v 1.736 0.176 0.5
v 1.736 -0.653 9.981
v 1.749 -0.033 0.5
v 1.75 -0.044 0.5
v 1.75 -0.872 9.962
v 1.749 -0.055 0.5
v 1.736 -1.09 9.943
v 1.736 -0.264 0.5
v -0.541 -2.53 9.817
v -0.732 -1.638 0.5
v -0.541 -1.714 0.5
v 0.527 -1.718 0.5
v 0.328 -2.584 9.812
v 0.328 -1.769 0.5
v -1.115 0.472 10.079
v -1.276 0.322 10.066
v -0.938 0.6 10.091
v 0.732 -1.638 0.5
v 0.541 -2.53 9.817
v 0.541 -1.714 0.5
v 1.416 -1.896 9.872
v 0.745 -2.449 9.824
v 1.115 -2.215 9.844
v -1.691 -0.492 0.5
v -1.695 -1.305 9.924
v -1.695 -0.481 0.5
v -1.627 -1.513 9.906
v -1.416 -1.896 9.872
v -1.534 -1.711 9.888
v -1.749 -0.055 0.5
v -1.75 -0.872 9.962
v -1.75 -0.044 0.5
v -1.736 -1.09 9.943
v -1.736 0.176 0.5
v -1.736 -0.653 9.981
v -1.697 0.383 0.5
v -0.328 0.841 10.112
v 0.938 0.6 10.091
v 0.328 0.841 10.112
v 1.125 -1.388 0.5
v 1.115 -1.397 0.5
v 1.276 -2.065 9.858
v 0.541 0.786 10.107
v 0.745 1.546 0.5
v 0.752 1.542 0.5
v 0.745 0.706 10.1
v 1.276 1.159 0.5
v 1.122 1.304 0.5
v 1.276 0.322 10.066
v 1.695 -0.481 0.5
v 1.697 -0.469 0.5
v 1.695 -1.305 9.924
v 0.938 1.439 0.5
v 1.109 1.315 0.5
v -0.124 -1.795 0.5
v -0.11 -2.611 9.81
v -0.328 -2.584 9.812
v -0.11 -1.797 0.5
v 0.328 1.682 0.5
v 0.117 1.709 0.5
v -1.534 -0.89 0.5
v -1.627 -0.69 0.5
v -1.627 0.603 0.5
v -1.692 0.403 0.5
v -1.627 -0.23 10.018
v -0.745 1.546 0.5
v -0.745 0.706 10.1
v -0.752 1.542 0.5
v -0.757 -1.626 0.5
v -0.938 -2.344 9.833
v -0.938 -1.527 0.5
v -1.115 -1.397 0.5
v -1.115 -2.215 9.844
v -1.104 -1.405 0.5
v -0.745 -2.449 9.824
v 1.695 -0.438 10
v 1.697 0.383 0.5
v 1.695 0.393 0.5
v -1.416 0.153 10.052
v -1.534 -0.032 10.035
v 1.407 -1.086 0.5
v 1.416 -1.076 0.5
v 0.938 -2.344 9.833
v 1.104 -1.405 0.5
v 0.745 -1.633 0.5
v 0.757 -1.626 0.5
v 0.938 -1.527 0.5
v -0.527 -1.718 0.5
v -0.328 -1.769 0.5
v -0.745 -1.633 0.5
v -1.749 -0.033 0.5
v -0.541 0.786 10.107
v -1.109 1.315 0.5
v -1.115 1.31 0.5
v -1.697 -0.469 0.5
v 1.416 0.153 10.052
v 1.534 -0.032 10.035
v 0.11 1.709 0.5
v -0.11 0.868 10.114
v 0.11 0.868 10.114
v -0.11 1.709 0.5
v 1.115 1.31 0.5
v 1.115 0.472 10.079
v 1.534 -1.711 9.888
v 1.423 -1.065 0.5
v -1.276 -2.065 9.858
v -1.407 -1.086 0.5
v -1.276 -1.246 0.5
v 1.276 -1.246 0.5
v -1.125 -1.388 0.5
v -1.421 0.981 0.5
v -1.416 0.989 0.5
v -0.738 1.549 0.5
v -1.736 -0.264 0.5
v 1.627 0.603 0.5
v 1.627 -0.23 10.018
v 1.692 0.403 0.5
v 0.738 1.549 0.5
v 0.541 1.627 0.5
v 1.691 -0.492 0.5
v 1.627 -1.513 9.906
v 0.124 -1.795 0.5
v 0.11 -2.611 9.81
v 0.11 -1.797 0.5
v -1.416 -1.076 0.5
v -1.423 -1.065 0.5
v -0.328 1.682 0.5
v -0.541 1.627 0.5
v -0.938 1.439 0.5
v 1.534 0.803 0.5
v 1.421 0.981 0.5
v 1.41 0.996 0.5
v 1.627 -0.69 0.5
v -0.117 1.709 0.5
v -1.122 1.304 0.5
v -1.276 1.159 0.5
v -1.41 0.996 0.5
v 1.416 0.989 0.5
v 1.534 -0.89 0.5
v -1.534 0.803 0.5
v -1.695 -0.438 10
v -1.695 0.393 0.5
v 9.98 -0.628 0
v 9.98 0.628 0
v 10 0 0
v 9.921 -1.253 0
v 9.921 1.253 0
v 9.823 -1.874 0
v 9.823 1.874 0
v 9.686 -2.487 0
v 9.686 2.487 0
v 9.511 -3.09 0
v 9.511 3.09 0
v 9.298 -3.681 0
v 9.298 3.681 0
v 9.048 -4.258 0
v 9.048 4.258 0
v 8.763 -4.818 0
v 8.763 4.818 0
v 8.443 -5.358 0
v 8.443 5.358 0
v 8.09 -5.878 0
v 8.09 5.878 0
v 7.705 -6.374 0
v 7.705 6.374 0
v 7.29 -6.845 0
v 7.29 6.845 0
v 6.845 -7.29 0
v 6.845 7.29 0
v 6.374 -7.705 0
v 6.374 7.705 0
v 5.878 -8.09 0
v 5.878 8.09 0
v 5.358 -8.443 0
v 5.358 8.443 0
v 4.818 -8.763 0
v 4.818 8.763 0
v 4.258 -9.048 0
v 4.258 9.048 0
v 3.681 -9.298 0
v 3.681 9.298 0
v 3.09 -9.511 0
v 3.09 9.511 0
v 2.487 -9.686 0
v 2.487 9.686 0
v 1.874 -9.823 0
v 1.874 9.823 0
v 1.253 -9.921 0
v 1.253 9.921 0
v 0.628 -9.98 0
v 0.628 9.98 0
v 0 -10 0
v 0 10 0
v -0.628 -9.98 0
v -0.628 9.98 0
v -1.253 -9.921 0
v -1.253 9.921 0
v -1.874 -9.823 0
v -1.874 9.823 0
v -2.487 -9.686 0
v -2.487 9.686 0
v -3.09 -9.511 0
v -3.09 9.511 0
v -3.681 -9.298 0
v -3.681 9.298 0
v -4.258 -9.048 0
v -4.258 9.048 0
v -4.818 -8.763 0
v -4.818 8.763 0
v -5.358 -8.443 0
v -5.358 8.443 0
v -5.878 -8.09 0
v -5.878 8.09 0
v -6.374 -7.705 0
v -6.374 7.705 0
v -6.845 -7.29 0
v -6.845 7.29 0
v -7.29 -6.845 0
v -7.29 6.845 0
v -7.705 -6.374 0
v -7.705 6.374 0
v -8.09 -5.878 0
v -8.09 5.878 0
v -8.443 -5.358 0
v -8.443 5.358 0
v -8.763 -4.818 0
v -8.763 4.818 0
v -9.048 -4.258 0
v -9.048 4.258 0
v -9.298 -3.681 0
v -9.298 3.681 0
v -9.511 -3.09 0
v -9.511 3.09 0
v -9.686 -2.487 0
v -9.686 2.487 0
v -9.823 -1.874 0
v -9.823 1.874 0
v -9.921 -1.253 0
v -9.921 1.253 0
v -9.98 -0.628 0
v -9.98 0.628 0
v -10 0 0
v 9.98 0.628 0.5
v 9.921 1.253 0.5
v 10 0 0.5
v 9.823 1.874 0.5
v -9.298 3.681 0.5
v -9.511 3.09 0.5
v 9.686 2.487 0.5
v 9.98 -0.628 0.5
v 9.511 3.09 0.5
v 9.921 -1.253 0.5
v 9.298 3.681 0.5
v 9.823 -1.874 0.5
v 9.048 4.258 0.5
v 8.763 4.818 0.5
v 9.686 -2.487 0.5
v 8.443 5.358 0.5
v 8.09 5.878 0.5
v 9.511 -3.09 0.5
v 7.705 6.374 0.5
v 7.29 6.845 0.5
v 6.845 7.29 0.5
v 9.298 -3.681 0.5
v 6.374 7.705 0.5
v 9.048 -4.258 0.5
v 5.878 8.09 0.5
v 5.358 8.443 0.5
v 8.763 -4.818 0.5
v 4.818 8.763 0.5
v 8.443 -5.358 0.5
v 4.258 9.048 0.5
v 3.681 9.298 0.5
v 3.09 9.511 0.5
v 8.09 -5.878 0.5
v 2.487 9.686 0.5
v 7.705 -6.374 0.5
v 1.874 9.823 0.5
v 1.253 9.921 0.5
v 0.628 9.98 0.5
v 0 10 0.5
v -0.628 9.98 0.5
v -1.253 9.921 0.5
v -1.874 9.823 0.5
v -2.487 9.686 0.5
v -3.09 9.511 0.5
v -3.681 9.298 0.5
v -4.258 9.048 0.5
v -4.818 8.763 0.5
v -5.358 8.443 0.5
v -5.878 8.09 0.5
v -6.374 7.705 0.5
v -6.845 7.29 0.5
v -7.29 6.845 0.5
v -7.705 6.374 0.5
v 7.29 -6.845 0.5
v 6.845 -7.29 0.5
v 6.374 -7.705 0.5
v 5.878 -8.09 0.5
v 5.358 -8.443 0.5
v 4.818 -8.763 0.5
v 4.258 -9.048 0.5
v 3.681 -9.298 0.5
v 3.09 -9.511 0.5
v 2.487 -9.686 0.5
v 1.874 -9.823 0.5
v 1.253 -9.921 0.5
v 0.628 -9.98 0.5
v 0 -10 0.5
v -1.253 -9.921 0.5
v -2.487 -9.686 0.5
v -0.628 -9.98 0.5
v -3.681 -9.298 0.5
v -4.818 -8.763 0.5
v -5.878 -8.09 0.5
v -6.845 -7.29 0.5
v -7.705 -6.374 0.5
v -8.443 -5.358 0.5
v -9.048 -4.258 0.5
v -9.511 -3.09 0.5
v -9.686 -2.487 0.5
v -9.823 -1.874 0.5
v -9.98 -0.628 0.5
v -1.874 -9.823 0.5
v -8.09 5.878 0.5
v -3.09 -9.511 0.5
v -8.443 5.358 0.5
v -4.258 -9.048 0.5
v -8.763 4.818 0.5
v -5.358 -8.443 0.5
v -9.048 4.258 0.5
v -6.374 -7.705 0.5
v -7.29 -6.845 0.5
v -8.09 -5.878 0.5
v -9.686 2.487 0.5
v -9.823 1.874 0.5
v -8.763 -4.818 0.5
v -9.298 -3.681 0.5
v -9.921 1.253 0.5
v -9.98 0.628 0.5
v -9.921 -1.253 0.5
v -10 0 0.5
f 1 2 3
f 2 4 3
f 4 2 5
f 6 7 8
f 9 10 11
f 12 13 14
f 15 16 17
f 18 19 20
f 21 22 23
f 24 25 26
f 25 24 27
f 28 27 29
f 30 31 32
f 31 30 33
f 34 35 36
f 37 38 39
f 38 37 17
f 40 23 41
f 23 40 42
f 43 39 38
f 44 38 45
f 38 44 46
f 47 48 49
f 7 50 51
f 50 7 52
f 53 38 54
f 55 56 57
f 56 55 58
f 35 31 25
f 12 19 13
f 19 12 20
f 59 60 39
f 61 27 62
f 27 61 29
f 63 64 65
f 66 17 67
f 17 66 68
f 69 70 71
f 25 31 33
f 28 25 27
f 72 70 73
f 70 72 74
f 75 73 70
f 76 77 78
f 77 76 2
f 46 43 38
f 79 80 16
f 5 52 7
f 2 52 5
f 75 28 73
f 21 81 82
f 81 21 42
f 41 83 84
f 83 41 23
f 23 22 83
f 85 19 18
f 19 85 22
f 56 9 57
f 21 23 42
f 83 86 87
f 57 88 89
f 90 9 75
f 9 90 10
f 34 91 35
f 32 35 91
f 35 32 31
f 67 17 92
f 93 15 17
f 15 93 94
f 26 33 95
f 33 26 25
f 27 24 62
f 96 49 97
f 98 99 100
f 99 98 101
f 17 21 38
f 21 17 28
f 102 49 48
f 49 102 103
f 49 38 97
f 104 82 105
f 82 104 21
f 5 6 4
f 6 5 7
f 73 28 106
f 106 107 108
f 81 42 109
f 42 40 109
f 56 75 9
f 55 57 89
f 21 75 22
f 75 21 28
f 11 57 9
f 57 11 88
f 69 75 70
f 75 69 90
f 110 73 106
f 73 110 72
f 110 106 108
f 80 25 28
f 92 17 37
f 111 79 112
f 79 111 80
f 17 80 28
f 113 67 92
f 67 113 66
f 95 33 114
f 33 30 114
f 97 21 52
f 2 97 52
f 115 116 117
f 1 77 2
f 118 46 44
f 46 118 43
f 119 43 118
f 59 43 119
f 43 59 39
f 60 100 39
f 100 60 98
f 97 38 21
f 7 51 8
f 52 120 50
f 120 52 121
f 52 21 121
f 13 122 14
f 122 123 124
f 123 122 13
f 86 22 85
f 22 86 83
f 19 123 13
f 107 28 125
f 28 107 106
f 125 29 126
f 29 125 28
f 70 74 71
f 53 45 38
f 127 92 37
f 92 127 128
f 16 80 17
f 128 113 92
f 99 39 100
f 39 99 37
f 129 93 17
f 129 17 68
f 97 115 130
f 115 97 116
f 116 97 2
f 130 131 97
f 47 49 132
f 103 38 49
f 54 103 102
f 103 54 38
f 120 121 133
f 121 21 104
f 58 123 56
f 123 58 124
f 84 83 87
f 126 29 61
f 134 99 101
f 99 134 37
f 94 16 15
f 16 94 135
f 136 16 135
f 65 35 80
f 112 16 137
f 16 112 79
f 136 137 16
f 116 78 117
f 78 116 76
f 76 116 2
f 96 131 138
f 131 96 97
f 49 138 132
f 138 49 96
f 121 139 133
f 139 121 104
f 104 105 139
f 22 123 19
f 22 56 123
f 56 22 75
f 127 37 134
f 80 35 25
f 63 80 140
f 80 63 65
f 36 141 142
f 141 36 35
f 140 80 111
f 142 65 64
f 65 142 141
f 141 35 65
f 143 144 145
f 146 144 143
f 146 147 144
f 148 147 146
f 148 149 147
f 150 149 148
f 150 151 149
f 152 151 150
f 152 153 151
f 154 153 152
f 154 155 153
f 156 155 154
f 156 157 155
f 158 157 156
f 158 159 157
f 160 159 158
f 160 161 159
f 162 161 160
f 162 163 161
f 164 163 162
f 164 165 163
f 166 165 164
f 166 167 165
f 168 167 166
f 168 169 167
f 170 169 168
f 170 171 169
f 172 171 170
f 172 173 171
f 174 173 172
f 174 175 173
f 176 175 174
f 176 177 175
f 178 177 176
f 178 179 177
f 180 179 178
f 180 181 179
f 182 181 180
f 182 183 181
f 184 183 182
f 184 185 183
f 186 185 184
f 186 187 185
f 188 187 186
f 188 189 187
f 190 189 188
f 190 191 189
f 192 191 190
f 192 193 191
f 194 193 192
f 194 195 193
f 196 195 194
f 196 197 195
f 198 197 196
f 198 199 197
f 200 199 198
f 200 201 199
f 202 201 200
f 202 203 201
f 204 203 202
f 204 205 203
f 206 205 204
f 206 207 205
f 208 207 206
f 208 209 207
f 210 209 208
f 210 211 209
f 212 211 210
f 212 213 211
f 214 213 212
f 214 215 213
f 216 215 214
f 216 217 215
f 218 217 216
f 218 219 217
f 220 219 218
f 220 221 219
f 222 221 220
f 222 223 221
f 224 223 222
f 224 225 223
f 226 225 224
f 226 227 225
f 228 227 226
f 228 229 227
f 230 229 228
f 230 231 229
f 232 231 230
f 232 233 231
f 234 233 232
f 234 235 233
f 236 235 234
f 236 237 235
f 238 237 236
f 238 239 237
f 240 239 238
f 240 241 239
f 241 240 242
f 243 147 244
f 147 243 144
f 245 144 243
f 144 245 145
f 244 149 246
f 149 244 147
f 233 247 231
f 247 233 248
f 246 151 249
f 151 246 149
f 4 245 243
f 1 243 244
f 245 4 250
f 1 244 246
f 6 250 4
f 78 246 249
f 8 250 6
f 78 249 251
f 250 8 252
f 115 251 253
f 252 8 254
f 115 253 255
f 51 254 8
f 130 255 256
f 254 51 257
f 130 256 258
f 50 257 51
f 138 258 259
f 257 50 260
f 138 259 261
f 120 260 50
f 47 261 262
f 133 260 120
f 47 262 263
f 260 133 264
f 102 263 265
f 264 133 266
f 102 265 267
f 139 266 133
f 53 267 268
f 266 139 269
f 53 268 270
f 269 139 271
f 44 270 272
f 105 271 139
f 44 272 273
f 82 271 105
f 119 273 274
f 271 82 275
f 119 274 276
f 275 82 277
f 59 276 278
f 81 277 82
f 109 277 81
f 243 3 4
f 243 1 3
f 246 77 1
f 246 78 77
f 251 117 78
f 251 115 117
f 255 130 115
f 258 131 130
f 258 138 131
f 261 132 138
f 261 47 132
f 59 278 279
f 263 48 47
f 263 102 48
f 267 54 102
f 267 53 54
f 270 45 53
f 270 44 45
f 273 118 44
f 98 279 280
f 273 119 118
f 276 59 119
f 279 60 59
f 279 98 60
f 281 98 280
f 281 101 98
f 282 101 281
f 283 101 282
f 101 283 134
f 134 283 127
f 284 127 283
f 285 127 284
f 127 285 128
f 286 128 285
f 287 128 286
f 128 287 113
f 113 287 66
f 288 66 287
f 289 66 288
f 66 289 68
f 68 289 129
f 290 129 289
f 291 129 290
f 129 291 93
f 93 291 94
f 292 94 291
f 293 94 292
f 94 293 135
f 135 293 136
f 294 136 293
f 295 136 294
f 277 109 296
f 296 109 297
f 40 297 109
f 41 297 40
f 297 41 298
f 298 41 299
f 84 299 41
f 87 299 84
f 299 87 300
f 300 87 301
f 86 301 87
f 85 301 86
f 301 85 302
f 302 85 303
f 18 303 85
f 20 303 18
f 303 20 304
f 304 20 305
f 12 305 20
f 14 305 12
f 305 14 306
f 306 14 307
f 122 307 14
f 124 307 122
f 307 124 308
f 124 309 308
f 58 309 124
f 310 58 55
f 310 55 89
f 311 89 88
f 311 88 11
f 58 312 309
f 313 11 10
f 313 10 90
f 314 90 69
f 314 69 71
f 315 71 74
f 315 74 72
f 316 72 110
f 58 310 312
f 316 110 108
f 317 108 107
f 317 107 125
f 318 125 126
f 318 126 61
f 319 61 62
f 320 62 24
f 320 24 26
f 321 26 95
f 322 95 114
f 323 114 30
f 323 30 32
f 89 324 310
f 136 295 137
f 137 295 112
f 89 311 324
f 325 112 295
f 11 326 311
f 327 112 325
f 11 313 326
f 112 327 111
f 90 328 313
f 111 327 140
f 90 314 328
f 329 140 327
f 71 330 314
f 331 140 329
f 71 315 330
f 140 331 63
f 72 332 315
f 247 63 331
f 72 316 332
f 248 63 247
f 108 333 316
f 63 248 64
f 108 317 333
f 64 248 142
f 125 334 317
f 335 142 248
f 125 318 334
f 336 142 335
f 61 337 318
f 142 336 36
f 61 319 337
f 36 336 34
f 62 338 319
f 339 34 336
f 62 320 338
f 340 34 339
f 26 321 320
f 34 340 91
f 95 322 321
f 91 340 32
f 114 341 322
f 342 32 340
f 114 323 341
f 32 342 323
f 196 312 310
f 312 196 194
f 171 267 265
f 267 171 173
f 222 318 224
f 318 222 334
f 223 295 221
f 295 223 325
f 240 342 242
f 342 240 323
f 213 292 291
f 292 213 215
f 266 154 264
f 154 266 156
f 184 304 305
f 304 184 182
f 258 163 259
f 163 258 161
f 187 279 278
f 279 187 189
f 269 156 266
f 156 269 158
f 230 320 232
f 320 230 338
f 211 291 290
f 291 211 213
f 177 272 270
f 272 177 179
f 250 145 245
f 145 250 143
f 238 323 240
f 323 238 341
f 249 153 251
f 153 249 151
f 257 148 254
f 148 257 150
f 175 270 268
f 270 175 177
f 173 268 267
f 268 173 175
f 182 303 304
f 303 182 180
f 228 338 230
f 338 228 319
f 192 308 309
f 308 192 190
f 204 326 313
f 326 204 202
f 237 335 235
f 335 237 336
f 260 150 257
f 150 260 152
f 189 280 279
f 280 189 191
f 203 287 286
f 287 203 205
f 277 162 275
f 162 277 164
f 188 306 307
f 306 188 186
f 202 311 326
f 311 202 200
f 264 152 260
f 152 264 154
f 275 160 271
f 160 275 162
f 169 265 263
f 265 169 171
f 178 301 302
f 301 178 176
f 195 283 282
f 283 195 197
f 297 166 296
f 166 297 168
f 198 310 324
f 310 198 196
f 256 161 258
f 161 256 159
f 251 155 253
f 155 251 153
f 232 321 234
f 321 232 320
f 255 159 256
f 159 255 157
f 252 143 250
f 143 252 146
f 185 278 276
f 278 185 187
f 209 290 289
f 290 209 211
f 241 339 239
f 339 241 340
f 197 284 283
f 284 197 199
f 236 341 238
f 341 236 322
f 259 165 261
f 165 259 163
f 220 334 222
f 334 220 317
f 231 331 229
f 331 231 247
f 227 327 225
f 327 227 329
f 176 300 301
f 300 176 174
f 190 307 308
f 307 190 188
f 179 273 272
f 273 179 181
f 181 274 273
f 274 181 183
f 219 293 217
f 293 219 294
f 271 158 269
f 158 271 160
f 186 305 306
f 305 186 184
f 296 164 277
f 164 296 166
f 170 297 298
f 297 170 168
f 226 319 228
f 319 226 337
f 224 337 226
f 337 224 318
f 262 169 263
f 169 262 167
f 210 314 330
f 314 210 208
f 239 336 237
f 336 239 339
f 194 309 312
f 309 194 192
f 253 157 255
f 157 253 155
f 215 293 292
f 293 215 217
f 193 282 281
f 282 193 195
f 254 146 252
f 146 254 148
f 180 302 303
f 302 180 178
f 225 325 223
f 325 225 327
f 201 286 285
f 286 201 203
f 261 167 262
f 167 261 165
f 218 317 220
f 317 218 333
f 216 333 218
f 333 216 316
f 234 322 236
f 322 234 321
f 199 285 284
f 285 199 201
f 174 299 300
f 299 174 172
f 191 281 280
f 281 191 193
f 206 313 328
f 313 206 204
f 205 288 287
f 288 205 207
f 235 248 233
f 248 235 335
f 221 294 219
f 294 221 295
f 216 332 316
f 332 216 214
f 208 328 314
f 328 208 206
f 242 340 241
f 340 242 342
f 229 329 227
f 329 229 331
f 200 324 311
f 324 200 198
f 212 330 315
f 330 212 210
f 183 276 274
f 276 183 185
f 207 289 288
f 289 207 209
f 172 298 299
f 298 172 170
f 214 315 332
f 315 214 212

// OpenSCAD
cylinder(d=20, h=0.5, $fn=100);
intersection()
{
  rotate([5, 0, 0])
    cylinder(d=3.5, h=10, $fn=50);
  cylinder(d=15, h=30, $fn=5);
}
